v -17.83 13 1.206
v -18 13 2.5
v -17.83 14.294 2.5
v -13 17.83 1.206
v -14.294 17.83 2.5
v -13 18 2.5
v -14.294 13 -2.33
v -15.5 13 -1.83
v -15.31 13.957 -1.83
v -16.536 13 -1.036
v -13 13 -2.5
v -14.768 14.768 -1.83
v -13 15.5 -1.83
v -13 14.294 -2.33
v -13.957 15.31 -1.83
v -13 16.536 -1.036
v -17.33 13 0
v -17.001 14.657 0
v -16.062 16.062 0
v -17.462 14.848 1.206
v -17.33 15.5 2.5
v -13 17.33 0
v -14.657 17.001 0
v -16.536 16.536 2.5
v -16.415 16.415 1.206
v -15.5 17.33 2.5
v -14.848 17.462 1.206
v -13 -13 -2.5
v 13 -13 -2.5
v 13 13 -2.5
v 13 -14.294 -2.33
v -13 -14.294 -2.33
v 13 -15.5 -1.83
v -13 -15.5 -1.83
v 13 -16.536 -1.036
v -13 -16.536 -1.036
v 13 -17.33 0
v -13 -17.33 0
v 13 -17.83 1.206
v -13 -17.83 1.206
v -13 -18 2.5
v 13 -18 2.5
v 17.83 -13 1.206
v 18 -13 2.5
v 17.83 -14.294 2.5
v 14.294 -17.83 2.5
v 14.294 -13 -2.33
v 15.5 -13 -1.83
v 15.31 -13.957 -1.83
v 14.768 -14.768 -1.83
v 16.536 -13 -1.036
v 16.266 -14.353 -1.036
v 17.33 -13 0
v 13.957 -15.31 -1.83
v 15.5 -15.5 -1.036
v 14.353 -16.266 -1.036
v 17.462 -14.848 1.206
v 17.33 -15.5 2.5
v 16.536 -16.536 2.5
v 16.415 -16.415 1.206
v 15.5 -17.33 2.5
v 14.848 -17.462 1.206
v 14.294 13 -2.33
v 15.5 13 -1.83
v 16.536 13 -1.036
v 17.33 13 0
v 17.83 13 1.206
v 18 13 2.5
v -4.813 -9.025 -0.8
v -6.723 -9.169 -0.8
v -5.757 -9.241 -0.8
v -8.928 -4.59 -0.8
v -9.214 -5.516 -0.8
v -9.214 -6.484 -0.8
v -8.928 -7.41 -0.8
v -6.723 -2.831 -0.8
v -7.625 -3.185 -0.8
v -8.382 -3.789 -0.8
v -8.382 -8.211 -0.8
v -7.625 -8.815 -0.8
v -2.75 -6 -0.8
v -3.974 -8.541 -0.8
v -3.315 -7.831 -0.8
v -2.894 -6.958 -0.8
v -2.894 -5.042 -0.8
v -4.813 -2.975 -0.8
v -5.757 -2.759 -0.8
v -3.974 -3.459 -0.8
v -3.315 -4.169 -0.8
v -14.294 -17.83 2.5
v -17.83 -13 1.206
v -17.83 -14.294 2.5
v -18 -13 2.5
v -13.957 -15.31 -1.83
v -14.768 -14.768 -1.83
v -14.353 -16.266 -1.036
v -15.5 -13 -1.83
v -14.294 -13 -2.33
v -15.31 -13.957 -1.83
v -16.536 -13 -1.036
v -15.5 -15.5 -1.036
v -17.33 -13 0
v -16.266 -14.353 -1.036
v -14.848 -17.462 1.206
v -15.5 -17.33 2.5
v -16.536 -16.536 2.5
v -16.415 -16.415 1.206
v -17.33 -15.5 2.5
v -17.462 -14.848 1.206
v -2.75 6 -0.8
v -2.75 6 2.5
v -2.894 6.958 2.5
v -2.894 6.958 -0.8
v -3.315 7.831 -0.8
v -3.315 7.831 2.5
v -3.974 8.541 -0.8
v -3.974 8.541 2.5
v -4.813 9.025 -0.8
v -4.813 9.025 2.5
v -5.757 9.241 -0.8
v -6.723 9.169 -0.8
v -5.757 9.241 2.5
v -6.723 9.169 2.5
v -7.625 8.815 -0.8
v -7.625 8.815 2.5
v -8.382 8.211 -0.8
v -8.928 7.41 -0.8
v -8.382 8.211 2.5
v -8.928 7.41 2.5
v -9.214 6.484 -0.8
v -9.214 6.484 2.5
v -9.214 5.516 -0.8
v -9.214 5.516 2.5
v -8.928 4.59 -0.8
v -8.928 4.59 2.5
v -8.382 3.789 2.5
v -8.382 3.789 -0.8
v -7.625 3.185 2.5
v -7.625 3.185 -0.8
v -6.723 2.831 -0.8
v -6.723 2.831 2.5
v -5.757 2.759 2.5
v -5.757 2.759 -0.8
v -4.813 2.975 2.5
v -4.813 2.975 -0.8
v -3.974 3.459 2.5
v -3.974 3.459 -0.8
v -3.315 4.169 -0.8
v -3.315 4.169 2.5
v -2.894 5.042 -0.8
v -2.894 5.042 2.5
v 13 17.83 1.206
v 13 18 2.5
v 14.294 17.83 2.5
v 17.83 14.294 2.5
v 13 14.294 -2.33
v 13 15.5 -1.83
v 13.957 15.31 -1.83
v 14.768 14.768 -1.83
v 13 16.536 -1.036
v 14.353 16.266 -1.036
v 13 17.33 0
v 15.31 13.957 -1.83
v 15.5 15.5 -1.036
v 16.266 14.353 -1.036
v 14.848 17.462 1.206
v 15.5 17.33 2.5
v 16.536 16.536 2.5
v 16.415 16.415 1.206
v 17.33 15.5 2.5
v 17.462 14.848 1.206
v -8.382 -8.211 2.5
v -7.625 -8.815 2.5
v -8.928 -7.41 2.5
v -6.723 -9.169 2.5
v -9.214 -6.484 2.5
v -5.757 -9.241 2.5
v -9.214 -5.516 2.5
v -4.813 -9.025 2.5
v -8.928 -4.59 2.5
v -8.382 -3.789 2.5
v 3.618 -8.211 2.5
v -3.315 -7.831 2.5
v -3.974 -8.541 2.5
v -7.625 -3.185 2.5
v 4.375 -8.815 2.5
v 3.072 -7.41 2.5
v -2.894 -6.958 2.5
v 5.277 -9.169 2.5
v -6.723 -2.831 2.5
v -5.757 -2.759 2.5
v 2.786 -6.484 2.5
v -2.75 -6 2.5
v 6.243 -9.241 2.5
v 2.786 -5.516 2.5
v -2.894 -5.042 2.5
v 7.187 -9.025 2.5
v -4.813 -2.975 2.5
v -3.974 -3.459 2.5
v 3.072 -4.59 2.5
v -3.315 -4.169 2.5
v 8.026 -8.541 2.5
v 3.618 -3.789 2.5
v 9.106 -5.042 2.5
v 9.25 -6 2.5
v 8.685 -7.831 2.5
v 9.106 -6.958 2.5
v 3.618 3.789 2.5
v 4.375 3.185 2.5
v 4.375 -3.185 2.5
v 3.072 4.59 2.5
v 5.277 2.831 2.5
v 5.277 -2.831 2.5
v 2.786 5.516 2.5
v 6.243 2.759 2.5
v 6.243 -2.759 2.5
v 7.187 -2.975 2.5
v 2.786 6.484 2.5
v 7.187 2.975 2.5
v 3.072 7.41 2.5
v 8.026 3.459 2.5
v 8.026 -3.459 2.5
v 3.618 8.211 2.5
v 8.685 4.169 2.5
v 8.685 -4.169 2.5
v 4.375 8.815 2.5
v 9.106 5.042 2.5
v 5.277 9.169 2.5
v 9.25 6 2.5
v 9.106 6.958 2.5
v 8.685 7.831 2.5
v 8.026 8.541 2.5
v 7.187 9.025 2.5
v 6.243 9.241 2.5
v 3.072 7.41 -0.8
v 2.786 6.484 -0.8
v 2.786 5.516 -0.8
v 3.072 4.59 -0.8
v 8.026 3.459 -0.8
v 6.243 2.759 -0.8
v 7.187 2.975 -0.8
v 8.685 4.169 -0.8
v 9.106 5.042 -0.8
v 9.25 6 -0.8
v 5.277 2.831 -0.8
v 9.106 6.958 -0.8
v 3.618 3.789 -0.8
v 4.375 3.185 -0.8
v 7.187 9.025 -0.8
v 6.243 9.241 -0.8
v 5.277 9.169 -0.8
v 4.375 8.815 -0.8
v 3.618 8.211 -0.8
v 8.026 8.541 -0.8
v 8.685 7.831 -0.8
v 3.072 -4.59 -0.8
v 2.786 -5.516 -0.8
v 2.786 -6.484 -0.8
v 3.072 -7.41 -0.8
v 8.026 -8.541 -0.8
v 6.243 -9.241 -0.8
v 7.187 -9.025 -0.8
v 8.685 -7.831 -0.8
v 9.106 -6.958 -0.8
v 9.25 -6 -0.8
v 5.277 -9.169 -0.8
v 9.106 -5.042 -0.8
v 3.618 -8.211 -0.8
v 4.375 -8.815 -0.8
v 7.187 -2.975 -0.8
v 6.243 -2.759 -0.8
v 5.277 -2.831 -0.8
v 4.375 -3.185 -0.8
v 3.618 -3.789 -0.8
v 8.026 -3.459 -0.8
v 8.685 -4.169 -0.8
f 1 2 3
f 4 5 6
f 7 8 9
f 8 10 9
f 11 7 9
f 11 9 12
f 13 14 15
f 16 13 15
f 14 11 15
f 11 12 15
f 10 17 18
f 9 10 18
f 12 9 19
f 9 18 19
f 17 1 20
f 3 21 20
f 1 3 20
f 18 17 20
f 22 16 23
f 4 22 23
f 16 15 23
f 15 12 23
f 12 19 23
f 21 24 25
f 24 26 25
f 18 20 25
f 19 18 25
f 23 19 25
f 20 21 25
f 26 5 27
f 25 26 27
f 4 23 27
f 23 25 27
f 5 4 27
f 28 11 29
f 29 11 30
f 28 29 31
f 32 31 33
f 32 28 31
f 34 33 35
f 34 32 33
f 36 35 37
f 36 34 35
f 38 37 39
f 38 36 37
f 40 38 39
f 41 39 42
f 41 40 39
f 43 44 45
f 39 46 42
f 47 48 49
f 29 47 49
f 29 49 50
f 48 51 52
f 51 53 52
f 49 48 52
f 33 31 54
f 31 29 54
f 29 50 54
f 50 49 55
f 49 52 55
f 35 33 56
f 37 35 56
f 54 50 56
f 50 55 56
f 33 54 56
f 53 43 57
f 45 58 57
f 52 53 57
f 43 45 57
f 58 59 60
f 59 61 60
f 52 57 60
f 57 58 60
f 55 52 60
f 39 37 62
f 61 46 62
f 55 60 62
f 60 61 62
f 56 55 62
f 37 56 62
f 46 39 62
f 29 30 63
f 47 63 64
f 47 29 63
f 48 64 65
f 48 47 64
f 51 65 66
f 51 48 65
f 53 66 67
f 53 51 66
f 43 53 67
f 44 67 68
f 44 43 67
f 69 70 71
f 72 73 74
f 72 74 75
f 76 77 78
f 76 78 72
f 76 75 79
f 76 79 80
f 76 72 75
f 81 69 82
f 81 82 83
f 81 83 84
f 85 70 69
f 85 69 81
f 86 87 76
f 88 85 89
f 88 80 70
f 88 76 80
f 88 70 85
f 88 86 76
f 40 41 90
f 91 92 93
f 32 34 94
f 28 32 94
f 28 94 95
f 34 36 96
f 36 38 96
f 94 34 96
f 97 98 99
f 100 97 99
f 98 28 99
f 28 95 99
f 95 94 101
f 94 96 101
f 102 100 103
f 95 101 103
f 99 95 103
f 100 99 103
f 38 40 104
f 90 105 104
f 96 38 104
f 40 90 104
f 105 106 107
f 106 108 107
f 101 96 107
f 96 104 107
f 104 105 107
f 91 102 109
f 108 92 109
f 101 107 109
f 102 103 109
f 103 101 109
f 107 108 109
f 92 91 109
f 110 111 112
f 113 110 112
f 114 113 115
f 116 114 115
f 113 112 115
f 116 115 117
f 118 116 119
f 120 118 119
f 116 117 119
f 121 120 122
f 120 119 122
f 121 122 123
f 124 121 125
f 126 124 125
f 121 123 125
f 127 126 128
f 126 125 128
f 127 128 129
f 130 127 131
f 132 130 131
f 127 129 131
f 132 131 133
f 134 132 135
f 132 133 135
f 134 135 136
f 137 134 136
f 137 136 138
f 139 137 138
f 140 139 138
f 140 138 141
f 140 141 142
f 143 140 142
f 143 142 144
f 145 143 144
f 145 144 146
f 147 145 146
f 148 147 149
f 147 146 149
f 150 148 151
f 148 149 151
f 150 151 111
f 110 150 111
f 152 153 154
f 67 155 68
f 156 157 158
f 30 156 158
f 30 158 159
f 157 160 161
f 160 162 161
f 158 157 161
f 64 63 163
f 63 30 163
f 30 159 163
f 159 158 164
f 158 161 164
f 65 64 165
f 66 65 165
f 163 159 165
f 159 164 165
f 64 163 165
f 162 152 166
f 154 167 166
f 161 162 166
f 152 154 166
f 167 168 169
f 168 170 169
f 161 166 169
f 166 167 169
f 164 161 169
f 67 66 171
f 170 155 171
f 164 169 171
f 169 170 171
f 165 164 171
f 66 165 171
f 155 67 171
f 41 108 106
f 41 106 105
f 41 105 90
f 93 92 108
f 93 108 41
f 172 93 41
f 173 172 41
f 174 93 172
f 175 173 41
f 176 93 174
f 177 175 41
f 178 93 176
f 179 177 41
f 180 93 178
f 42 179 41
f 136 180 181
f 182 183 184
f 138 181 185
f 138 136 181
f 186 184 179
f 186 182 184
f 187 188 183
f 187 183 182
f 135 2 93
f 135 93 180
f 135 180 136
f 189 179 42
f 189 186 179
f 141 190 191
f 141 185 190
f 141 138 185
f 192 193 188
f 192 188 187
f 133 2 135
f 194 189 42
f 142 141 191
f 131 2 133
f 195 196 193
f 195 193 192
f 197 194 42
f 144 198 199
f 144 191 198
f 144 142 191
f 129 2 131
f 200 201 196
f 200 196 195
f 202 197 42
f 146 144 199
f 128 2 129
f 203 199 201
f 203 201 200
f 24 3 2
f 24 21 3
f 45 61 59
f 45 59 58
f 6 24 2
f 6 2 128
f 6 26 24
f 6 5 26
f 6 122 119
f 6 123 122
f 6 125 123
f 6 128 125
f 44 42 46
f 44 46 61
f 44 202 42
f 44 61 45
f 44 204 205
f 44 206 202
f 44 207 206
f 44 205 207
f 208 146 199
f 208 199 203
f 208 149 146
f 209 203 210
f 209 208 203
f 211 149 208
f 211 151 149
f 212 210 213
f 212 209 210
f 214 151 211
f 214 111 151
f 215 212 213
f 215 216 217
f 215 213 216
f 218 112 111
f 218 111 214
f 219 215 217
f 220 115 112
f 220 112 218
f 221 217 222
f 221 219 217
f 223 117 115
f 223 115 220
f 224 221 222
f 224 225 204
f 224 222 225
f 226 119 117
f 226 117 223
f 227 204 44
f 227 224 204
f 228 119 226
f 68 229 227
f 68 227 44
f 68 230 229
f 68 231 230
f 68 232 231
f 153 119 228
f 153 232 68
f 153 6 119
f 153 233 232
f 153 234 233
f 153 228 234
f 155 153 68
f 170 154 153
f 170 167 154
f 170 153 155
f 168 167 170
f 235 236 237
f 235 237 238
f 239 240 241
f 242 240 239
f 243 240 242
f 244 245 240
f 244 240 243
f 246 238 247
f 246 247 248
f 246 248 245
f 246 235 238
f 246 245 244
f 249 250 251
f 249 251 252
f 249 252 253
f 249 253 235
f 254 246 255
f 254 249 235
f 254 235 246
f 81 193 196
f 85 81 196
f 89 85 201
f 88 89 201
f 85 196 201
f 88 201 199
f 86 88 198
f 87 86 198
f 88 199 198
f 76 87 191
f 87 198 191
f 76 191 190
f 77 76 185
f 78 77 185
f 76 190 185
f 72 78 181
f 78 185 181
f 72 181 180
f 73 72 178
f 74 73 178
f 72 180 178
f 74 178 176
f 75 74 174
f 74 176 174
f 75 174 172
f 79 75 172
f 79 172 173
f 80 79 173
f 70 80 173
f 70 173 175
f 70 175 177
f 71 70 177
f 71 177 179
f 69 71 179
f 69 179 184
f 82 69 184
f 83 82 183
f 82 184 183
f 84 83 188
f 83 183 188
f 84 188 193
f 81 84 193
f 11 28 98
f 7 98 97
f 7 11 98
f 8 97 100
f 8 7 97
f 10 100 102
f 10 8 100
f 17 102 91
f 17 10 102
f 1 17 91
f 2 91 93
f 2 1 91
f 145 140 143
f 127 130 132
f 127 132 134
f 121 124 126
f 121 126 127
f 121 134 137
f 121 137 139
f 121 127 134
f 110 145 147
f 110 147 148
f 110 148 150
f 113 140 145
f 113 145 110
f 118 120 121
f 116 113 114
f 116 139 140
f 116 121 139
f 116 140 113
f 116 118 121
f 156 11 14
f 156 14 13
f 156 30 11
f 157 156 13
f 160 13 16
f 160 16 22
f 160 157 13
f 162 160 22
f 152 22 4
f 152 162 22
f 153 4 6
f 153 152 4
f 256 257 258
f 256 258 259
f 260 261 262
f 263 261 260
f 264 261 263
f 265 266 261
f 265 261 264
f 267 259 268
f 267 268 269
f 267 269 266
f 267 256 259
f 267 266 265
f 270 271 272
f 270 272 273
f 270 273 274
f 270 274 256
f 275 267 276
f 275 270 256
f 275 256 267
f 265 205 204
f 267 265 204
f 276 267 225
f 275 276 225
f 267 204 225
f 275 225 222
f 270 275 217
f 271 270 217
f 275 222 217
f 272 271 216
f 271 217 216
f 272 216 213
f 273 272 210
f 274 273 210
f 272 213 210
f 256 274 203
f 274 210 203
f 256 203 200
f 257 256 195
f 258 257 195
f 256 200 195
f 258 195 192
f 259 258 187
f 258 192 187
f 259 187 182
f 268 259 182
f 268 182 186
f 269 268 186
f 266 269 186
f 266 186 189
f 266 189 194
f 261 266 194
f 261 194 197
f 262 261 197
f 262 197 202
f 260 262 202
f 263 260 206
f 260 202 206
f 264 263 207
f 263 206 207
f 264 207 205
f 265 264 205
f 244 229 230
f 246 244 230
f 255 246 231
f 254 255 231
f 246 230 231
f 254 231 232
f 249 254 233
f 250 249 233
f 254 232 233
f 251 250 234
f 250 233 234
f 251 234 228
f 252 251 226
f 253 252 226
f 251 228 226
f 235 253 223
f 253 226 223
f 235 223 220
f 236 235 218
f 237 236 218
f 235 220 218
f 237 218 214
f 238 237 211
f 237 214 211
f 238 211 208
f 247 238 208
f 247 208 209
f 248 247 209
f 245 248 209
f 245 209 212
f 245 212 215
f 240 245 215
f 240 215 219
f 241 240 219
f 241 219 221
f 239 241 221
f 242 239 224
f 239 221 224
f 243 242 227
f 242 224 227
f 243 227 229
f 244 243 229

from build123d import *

# Parameters (mm, degrees)
F0_W     = 36
F0_H     = 36
F1_DEPTH = 2.5
F2_R     = 3.25
F3_DEPTH = 3.3
F4_R     = 5
F5_R     = 4.99999


# Not quite as in the source:
# - a fillet or chamfer is up to 0.001 mm smaller than in the source, because OpenCascade refuses the exact size


with BuildPart() as f1:
    # F0 (on Top) → F1 (new body, symmetric)
    with BuildSketch(Plane.XY):
        Rectangle(F0_W, F0_H)
    extrude(amount=F1_DEPTH, both=True)

    # F2 (on face) → F3 (cut)
    with BuildSketch(Plane.XY.offset(2.5)):
        with Locations((-6, 6)):
            Circle(F2_R)
        with Locations((6, 6)):
            Circle(F2_R)
        with Locations((6, -6)):
            Circle(F2_R)
        with Locations((-6, -6)):
            Circle(F2_R)
    extrude(amount=-F3_DEPTH, mode=Mode.SUBTRACT)

    # F4
    f4_edges = [f1.edges().sort_by_distance(p)[0] for p in [
        (-18, -18, 0),
        (-18, 18, 0),
        (18, -18, 0),
        (18, 18, 0),
    ]]
    fillet(f4_edges, radius=F4_R)

    # F5 (radius 5 in the source; OpenCascade refuses exactly that, so slightly less here)
    f5_edges = [f1.edges().sort_by_distance(p)[0] for p in [
        (0, 18, -2.5),
    ]]
    fillet(f5_edges, radius=F5_R)


solid = f1.part
